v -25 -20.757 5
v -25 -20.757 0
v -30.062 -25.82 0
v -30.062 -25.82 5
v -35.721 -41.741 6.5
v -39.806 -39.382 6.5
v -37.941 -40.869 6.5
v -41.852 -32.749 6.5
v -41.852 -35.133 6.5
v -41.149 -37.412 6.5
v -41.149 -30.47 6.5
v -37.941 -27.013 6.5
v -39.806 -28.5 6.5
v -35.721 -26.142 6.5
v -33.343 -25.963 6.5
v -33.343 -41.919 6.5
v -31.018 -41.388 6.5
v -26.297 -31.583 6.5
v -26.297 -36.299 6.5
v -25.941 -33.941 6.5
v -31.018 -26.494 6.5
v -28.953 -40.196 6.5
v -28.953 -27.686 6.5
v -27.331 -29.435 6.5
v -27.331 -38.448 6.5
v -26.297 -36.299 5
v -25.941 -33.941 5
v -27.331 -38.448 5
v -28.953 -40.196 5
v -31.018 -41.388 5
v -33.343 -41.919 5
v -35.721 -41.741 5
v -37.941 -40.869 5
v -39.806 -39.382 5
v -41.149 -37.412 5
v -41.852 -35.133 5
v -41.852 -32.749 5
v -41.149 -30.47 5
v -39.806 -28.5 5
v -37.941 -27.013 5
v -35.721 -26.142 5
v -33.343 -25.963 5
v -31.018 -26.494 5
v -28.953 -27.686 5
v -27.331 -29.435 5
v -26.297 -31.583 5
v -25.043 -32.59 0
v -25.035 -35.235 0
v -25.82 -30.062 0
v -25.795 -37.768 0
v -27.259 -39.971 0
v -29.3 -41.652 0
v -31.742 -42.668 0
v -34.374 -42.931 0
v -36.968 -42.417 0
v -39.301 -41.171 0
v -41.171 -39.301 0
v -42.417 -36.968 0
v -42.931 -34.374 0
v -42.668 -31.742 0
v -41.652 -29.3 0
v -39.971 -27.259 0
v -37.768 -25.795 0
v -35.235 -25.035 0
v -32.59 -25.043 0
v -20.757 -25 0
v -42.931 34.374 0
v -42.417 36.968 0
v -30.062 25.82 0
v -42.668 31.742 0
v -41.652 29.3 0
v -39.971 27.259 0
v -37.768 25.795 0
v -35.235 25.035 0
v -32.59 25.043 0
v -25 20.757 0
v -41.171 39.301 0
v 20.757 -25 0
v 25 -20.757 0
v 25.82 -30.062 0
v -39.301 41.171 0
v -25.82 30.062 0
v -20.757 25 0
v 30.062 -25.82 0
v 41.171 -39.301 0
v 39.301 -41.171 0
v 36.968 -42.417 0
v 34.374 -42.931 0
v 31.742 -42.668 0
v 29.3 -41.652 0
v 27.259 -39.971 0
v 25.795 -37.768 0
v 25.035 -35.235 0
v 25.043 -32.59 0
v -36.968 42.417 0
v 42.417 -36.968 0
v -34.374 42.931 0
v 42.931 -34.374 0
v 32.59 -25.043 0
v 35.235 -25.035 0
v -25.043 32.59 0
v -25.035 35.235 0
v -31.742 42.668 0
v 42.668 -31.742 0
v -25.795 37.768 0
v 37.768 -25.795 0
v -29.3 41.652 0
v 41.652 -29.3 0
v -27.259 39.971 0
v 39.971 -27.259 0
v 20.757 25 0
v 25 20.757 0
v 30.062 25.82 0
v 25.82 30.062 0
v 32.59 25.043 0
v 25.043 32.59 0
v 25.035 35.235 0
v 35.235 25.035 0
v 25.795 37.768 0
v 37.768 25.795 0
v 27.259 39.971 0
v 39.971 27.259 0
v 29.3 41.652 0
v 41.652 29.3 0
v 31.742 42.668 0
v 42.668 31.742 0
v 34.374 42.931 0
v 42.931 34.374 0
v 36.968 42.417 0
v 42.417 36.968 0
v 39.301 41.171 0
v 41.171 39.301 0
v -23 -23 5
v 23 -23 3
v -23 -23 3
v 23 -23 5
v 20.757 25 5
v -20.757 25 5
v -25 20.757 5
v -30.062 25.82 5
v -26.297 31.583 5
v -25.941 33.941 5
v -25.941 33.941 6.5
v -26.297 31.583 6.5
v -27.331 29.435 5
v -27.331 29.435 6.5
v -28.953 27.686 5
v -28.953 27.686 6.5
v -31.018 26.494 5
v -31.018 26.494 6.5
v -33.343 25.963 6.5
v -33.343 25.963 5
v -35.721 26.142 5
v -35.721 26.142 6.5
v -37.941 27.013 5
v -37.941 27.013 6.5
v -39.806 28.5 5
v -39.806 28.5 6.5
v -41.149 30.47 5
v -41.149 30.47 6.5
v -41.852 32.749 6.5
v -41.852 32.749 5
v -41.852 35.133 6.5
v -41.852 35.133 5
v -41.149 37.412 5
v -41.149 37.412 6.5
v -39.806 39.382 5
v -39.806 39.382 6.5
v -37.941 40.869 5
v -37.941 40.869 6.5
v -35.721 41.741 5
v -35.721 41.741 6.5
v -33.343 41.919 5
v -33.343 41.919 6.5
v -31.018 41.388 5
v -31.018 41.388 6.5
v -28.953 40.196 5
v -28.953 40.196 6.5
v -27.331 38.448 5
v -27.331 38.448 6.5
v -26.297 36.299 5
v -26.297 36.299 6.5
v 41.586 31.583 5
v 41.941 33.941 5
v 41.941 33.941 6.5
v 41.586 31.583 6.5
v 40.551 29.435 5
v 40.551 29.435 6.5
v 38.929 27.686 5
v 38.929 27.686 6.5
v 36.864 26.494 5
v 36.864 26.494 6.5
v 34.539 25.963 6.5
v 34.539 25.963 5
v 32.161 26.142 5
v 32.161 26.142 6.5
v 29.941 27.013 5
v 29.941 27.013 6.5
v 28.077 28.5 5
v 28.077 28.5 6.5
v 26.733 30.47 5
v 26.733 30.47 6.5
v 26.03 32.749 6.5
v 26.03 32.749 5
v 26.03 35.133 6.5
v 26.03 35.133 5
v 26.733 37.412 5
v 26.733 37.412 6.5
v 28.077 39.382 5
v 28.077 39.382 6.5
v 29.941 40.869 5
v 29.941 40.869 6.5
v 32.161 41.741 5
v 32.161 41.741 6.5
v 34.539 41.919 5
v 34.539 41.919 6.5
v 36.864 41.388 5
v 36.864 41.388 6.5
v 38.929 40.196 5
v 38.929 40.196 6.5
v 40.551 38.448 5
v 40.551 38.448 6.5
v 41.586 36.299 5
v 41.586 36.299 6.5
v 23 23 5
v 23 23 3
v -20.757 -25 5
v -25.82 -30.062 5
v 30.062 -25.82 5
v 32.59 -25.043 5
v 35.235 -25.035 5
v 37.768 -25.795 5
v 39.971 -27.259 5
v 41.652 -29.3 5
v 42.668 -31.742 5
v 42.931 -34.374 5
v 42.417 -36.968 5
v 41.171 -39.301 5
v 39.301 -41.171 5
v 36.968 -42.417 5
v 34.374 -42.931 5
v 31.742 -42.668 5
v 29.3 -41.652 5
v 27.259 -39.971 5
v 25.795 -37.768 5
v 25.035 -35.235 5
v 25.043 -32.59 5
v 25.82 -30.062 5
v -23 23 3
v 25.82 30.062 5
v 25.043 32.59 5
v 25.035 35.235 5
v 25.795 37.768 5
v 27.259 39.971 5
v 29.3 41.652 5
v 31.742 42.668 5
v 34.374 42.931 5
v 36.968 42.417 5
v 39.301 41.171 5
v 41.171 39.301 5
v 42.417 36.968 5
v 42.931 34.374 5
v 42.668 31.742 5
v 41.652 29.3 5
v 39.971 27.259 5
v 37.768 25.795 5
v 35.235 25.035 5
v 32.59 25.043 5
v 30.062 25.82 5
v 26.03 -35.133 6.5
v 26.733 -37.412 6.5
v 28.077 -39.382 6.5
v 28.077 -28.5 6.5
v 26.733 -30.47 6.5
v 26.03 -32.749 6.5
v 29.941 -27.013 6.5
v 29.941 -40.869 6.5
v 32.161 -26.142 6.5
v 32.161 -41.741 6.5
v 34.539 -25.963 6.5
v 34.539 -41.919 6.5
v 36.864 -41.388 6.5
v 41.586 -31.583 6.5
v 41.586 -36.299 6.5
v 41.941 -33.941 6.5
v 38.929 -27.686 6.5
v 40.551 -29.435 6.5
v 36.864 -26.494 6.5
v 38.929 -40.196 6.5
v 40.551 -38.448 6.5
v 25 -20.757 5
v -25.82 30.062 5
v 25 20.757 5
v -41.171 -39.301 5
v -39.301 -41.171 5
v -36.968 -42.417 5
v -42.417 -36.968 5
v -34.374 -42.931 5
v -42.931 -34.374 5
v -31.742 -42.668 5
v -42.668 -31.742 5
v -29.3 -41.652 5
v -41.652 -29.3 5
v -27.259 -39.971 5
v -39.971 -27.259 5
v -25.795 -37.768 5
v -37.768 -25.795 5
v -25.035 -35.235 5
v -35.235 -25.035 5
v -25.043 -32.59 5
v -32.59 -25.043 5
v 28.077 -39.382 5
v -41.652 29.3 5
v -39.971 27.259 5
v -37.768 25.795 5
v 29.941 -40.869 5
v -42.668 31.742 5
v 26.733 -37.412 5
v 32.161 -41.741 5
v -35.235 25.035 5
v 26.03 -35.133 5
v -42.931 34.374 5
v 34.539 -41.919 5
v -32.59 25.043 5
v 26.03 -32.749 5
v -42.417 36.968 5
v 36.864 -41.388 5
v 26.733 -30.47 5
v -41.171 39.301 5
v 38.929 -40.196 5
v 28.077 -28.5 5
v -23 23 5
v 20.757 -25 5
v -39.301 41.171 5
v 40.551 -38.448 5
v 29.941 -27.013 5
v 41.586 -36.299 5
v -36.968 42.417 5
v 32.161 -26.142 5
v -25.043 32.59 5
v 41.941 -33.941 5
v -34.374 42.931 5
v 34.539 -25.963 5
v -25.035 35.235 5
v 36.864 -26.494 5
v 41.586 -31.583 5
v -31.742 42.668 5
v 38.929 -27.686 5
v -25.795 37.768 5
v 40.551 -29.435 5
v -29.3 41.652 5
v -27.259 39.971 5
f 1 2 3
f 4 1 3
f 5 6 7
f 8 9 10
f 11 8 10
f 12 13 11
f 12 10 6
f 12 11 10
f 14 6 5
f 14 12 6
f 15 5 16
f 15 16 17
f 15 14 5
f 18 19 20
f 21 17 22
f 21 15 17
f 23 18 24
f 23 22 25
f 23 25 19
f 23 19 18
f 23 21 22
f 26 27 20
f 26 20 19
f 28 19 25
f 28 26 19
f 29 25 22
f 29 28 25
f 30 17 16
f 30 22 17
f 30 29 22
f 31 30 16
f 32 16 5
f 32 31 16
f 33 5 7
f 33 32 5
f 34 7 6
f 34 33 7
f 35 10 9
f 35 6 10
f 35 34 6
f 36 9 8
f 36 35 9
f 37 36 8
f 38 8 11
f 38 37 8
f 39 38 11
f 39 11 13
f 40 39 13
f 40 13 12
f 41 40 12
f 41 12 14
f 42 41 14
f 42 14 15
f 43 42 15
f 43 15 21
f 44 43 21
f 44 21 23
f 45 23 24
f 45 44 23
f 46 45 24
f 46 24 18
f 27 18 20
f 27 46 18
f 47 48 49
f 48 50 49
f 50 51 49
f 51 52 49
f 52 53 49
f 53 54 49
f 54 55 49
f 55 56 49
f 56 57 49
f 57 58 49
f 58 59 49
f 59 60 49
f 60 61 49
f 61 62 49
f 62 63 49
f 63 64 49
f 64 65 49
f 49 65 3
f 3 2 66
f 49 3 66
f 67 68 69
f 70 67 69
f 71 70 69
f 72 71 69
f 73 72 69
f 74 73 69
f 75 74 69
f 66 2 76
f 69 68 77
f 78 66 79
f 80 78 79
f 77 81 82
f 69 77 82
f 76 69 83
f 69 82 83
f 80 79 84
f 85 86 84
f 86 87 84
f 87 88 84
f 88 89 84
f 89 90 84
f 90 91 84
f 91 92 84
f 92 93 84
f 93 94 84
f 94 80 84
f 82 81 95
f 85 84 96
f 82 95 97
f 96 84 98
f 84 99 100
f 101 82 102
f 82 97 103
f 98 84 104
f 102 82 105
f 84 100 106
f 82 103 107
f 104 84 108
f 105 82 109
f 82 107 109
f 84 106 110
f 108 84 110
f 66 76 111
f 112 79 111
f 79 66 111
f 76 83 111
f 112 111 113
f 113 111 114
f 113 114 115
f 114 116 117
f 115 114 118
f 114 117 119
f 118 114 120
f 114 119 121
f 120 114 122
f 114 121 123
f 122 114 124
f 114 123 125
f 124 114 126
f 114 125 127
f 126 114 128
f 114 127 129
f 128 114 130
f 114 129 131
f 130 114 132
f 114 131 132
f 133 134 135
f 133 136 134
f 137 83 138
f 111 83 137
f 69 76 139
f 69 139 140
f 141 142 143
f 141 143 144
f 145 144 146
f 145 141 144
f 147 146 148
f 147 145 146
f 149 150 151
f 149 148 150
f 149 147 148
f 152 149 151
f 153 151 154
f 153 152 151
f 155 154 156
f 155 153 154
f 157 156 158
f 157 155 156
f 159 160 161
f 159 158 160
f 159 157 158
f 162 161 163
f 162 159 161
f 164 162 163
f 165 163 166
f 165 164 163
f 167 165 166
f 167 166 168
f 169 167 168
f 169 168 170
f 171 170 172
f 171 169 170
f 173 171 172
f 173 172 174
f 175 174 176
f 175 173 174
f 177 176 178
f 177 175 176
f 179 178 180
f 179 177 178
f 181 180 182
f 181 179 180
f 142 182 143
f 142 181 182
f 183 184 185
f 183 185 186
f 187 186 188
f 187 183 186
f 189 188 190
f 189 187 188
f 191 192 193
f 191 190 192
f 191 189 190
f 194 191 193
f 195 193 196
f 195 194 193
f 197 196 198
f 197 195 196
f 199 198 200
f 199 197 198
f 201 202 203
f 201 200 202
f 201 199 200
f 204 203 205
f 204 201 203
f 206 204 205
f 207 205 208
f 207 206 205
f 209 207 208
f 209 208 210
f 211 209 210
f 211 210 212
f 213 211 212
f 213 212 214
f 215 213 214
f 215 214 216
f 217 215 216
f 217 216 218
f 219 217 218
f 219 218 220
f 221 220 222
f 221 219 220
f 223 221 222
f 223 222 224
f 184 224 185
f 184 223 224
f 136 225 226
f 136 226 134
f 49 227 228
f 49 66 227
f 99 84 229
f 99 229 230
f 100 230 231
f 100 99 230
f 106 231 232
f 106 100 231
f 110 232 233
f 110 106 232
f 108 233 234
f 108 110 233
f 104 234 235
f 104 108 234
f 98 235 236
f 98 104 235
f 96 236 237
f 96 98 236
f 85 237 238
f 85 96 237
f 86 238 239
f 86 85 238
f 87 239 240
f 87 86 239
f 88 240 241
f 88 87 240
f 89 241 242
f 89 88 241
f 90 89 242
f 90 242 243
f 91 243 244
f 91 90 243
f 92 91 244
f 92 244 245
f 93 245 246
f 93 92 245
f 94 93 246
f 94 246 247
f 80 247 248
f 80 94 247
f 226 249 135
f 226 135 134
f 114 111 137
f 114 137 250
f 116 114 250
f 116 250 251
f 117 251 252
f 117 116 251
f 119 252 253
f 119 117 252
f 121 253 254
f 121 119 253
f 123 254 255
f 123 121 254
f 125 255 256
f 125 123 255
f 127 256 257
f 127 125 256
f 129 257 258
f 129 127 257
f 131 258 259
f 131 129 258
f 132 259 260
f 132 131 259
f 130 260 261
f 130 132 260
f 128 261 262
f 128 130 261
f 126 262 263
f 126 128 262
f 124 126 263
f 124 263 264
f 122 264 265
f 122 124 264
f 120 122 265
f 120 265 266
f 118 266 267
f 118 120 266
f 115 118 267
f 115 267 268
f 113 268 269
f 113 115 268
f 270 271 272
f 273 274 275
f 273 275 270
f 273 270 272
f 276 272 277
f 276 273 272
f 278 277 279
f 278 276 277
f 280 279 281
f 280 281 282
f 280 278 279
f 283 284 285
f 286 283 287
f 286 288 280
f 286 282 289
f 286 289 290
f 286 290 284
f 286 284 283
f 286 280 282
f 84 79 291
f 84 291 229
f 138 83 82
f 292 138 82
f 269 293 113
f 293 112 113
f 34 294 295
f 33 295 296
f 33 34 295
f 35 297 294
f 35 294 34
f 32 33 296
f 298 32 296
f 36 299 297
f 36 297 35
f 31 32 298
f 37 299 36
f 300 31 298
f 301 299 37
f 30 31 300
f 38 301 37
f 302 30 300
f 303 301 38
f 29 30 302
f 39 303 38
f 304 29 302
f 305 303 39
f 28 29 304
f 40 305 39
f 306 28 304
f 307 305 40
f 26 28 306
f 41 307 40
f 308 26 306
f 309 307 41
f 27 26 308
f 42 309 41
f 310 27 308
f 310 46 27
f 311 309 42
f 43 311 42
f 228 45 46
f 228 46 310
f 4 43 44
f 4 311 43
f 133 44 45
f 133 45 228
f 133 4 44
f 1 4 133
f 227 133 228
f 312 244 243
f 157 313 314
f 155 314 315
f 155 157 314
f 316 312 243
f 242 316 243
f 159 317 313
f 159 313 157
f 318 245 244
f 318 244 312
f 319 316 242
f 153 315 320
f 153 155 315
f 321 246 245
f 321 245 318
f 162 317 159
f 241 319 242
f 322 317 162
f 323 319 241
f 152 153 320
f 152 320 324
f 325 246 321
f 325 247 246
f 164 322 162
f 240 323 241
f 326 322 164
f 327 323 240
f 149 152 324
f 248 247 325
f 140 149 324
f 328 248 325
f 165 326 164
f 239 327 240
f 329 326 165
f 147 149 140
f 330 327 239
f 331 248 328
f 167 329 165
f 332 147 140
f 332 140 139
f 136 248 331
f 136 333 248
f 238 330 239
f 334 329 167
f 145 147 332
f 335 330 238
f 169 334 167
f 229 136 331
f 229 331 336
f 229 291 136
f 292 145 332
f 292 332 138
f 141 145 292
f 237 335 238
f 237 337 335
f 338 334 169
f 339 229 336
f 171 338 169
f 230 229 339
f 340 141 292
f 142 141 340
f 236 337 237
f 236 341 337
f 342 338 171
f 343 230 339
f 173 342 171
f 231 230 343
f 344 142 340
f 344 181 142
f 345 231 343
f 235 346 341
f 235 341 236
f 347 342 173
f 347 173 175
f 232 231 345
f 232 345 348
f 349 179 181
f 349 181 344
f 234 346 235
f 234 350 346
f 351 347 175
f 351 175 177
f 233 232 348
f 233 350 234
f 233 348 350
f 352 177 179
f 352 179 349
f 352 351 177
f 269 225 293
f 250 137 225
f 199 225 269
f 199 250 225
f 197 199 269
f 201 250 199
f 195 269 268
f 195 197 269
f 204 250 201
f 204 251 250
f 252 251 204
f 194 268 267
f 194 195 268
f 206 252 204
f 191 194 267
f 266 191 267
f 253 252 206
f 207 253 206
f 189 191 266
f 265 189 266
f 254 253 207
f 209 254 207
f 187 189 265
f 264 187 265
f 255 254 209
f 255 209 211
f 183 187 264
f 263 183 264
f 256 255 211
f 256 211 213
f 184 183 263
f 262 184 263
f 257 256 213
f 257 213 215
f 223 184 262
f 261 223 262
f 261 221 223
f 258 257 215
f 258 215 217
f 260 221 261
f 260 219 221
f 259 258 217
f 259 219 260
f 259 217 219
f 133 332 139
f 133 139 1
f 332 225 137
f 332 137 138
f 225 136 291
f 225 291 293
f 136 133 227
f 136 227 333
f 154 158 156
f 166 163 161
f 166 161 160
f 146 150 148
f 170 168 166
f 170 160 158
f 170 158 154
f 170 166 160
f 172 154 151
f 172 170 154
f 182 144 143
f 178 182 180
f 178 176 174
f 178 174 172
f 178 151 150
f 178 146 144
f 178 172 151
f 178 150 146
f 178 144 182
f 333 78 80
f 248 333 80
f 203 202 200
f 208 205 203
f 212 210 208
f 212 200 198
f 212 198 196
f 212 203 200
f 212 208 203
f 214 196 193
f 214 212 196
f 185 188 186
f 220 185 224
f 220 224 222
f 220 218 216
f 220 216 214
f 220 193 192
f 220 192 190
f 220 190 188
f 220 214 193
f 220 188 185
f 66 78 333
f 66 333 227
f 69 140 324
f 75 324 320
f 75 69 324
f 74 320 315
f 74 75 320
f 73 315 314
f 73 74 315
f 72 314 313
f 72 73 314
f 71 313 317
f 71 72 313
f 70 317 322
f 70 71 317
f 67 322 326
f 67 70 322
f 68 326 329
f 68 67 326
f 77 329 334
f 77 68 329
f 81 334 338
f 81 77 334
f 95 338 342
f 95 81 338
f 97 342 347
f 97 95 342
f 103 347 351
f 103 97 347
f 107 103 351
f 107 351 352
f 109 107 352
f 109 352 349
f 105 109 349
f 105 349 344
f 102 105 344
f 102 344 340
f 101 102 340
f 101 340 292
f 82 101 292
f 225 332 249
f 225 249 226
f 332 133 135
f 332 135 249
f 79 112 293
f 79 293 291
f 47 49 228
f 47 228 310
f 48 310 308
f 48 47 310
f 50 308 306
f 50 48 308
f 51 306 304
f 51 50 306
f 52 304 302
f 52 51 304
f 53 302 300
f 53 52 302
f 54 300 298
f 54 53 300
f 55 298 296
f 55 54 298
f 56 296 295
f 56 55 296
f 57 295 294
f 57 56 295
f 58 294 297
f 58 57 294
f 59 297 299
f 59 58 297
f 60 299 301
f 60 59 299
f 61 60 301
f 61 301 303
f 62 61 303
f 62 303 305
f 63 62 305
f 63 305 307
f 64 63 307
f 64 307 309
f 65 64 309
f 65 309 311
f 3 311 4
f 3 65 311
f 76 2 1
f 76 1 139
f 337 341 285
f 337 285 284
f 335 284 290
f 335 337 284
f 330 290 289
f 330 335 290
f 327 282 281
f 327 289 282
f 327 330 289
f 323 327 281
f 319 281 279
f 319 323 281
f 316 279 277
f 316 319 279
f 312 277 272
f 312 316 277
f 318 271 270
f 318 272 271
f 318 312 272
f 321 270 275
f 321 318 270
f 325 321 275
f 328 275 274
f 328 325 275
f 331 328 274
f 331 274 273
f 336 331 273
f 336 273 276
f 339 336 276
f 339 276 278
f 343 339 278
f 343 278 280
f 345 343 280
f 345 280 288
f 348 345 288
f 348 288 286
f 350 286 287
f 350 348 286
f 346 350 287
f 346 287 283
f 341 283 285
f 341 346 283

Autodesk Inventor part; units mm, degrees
ref_plane "YZ Plane" through (0, 0, 0) normal (1, 0, 0) x (0, 1, 0)
ref_plane "XZ Plane" through (0, 0, 0) normal (0, 1, 0) x (-1, 0, 0)
ref_plane "XY Plane" through (0, 0, 0) normal (0, 0, 1) x (1, 0, 0)
sketch "Sketch1" plane through (0, 0, 0) normal (0, 0, 1) x (1, 0, 0)
  line L0 (-25, 25) -> (25, 25)
  line L1 (25, 25) -> (25, -25)
  line L2 (25, -25) -> (-25, -25)
  line L3 (-25, -25) -> (-25, 25)
  line L4 (-25, 25) -> (25, -25) construction
  line L5 (25, 25) -> (-25, -25) construction
  line L6 (0, 0) -> (-33.9411, 33.9411)
  circle A0 centre (-33.9411, 33.9411) radius 9
  line L7 (0, 0) -> (2.1213, 2.1213)
  line L8 (0, 0) -> (-2.1213, -2.1213)
  line L9 (2.1213, 2.1213) -> (-25.8198, 30.0624)
  line L10 (-2.1213, -2.1213) -> (-30.0624, 25.8198)
  line L11 (0, 0) -> (33.9411, -33.9411)
  circle A1 centre (33.9411, -33.9411) radius 9
  line L12 (2.1213, 2.1213) -> (30.0624, -25.8198)
  line L13 (-2.1213, -2.1213) -> (25.8198, -30.0624)
  line L14 (0, 25) -> (0, -25) construction
  line L15 (25, 25) -> (-25, 25)
  line L16 (-25, 25) -> (-25, -25)
  line L17 (-25, -25) -> (25, -25)
  line L18 (25, -25) -> (25, 25)
  line L19 (25, 25) -> (-25, -25) construction
  line L20 (-25, 25) -> (25, -25) construction
  line L21 (0, 0) -> (33.9411, 33.9411)
  circle A2 centre (33.9411, 33.9411) radius 9
  line L22 (0, 0) -> (-2.1213, 2.1213)
  line L23 (0, 0) -> (2.1213, -2.1213)
  line L24 (-2.1213, 2.1213) -> (25.8198, 30.0624)
  line L25 (2.1213, -2.1213) -> (30.0624, 25.8198)
  line L26 (0, 0) -> (-33.9411, -33.9411)
  circle A3 centre (-33.9411, -33.9411) radius 9
  line L27 (-2.1213, 2.1213) -> (-30.0624, -25.8198)
  line L28 (2.1213, -2.1213) -> (-25.8198, -30.0624)
  point P0 (-25, 20.7574)
  point P1 (-25, -20.7574)
  point P2 (-20.7574, -25)
  point P3 (20.7574, -25)
  point P4 (25, -20.7574)
  point P5 (25, 20.7574)
  point P6 (20.7574, 25)
  point P7 (-20.7574, 25)
  dimension "d0" = 50
  dimension "d1" = 50
  dimension "d5" = 48
  dimension "d6" = 18
  dimension "d7" = 3
  dimension "d8" = 3
extrude "Extrusion1" add sketch "Sketch1" along normal blind 5
sketch "Sketch2" plane through (0, 0, 5) normal (0, 0, 1) x (1, 0, 0)
  line L0 (-23, 23) -> (23, 23)
  line L1 (23, 23) -> (23, -23)
  line L2 (23, -23) -> (-23, -23)
  line L3 (-23, -23) -> (-23, 23)
  line L4 (-23, 23) -> (23, -23) construction
  line L5 (23, 23) -> (-23, -23) construction
  point P0 (0, 0)
  dimension "d11" = 46
  dimension "d12" = 46
extrude "Extrusion2" cut sketch "Sketch2" against normal blind 2
sketch "Sketch3" plane through (0, 0, 5) normal (0, 0, 1) x (1, 0, 0)
  arc A0 (-25.8198, 30.0624) -> (-30.0624, 25.8198) centre (-33.9411, 33.9411) ccw projected
  circle A1 centre (-33.9411, 33.9411) radius 8
  circle A2 centre (-33.9411, -33.9411) radius 8
  circle A3 centre (33.9411, -33.9411) radius 8
  circle A4 centre (33.9411, 33.9411) radius 8
  point P0 (0, 0)
  dimension "d15" = 16
  dimension "d18" = 360
extrude "Extrusion3" add sketch "Sketch3" along normal blind 1.5
properties part number "aruco_holder"
